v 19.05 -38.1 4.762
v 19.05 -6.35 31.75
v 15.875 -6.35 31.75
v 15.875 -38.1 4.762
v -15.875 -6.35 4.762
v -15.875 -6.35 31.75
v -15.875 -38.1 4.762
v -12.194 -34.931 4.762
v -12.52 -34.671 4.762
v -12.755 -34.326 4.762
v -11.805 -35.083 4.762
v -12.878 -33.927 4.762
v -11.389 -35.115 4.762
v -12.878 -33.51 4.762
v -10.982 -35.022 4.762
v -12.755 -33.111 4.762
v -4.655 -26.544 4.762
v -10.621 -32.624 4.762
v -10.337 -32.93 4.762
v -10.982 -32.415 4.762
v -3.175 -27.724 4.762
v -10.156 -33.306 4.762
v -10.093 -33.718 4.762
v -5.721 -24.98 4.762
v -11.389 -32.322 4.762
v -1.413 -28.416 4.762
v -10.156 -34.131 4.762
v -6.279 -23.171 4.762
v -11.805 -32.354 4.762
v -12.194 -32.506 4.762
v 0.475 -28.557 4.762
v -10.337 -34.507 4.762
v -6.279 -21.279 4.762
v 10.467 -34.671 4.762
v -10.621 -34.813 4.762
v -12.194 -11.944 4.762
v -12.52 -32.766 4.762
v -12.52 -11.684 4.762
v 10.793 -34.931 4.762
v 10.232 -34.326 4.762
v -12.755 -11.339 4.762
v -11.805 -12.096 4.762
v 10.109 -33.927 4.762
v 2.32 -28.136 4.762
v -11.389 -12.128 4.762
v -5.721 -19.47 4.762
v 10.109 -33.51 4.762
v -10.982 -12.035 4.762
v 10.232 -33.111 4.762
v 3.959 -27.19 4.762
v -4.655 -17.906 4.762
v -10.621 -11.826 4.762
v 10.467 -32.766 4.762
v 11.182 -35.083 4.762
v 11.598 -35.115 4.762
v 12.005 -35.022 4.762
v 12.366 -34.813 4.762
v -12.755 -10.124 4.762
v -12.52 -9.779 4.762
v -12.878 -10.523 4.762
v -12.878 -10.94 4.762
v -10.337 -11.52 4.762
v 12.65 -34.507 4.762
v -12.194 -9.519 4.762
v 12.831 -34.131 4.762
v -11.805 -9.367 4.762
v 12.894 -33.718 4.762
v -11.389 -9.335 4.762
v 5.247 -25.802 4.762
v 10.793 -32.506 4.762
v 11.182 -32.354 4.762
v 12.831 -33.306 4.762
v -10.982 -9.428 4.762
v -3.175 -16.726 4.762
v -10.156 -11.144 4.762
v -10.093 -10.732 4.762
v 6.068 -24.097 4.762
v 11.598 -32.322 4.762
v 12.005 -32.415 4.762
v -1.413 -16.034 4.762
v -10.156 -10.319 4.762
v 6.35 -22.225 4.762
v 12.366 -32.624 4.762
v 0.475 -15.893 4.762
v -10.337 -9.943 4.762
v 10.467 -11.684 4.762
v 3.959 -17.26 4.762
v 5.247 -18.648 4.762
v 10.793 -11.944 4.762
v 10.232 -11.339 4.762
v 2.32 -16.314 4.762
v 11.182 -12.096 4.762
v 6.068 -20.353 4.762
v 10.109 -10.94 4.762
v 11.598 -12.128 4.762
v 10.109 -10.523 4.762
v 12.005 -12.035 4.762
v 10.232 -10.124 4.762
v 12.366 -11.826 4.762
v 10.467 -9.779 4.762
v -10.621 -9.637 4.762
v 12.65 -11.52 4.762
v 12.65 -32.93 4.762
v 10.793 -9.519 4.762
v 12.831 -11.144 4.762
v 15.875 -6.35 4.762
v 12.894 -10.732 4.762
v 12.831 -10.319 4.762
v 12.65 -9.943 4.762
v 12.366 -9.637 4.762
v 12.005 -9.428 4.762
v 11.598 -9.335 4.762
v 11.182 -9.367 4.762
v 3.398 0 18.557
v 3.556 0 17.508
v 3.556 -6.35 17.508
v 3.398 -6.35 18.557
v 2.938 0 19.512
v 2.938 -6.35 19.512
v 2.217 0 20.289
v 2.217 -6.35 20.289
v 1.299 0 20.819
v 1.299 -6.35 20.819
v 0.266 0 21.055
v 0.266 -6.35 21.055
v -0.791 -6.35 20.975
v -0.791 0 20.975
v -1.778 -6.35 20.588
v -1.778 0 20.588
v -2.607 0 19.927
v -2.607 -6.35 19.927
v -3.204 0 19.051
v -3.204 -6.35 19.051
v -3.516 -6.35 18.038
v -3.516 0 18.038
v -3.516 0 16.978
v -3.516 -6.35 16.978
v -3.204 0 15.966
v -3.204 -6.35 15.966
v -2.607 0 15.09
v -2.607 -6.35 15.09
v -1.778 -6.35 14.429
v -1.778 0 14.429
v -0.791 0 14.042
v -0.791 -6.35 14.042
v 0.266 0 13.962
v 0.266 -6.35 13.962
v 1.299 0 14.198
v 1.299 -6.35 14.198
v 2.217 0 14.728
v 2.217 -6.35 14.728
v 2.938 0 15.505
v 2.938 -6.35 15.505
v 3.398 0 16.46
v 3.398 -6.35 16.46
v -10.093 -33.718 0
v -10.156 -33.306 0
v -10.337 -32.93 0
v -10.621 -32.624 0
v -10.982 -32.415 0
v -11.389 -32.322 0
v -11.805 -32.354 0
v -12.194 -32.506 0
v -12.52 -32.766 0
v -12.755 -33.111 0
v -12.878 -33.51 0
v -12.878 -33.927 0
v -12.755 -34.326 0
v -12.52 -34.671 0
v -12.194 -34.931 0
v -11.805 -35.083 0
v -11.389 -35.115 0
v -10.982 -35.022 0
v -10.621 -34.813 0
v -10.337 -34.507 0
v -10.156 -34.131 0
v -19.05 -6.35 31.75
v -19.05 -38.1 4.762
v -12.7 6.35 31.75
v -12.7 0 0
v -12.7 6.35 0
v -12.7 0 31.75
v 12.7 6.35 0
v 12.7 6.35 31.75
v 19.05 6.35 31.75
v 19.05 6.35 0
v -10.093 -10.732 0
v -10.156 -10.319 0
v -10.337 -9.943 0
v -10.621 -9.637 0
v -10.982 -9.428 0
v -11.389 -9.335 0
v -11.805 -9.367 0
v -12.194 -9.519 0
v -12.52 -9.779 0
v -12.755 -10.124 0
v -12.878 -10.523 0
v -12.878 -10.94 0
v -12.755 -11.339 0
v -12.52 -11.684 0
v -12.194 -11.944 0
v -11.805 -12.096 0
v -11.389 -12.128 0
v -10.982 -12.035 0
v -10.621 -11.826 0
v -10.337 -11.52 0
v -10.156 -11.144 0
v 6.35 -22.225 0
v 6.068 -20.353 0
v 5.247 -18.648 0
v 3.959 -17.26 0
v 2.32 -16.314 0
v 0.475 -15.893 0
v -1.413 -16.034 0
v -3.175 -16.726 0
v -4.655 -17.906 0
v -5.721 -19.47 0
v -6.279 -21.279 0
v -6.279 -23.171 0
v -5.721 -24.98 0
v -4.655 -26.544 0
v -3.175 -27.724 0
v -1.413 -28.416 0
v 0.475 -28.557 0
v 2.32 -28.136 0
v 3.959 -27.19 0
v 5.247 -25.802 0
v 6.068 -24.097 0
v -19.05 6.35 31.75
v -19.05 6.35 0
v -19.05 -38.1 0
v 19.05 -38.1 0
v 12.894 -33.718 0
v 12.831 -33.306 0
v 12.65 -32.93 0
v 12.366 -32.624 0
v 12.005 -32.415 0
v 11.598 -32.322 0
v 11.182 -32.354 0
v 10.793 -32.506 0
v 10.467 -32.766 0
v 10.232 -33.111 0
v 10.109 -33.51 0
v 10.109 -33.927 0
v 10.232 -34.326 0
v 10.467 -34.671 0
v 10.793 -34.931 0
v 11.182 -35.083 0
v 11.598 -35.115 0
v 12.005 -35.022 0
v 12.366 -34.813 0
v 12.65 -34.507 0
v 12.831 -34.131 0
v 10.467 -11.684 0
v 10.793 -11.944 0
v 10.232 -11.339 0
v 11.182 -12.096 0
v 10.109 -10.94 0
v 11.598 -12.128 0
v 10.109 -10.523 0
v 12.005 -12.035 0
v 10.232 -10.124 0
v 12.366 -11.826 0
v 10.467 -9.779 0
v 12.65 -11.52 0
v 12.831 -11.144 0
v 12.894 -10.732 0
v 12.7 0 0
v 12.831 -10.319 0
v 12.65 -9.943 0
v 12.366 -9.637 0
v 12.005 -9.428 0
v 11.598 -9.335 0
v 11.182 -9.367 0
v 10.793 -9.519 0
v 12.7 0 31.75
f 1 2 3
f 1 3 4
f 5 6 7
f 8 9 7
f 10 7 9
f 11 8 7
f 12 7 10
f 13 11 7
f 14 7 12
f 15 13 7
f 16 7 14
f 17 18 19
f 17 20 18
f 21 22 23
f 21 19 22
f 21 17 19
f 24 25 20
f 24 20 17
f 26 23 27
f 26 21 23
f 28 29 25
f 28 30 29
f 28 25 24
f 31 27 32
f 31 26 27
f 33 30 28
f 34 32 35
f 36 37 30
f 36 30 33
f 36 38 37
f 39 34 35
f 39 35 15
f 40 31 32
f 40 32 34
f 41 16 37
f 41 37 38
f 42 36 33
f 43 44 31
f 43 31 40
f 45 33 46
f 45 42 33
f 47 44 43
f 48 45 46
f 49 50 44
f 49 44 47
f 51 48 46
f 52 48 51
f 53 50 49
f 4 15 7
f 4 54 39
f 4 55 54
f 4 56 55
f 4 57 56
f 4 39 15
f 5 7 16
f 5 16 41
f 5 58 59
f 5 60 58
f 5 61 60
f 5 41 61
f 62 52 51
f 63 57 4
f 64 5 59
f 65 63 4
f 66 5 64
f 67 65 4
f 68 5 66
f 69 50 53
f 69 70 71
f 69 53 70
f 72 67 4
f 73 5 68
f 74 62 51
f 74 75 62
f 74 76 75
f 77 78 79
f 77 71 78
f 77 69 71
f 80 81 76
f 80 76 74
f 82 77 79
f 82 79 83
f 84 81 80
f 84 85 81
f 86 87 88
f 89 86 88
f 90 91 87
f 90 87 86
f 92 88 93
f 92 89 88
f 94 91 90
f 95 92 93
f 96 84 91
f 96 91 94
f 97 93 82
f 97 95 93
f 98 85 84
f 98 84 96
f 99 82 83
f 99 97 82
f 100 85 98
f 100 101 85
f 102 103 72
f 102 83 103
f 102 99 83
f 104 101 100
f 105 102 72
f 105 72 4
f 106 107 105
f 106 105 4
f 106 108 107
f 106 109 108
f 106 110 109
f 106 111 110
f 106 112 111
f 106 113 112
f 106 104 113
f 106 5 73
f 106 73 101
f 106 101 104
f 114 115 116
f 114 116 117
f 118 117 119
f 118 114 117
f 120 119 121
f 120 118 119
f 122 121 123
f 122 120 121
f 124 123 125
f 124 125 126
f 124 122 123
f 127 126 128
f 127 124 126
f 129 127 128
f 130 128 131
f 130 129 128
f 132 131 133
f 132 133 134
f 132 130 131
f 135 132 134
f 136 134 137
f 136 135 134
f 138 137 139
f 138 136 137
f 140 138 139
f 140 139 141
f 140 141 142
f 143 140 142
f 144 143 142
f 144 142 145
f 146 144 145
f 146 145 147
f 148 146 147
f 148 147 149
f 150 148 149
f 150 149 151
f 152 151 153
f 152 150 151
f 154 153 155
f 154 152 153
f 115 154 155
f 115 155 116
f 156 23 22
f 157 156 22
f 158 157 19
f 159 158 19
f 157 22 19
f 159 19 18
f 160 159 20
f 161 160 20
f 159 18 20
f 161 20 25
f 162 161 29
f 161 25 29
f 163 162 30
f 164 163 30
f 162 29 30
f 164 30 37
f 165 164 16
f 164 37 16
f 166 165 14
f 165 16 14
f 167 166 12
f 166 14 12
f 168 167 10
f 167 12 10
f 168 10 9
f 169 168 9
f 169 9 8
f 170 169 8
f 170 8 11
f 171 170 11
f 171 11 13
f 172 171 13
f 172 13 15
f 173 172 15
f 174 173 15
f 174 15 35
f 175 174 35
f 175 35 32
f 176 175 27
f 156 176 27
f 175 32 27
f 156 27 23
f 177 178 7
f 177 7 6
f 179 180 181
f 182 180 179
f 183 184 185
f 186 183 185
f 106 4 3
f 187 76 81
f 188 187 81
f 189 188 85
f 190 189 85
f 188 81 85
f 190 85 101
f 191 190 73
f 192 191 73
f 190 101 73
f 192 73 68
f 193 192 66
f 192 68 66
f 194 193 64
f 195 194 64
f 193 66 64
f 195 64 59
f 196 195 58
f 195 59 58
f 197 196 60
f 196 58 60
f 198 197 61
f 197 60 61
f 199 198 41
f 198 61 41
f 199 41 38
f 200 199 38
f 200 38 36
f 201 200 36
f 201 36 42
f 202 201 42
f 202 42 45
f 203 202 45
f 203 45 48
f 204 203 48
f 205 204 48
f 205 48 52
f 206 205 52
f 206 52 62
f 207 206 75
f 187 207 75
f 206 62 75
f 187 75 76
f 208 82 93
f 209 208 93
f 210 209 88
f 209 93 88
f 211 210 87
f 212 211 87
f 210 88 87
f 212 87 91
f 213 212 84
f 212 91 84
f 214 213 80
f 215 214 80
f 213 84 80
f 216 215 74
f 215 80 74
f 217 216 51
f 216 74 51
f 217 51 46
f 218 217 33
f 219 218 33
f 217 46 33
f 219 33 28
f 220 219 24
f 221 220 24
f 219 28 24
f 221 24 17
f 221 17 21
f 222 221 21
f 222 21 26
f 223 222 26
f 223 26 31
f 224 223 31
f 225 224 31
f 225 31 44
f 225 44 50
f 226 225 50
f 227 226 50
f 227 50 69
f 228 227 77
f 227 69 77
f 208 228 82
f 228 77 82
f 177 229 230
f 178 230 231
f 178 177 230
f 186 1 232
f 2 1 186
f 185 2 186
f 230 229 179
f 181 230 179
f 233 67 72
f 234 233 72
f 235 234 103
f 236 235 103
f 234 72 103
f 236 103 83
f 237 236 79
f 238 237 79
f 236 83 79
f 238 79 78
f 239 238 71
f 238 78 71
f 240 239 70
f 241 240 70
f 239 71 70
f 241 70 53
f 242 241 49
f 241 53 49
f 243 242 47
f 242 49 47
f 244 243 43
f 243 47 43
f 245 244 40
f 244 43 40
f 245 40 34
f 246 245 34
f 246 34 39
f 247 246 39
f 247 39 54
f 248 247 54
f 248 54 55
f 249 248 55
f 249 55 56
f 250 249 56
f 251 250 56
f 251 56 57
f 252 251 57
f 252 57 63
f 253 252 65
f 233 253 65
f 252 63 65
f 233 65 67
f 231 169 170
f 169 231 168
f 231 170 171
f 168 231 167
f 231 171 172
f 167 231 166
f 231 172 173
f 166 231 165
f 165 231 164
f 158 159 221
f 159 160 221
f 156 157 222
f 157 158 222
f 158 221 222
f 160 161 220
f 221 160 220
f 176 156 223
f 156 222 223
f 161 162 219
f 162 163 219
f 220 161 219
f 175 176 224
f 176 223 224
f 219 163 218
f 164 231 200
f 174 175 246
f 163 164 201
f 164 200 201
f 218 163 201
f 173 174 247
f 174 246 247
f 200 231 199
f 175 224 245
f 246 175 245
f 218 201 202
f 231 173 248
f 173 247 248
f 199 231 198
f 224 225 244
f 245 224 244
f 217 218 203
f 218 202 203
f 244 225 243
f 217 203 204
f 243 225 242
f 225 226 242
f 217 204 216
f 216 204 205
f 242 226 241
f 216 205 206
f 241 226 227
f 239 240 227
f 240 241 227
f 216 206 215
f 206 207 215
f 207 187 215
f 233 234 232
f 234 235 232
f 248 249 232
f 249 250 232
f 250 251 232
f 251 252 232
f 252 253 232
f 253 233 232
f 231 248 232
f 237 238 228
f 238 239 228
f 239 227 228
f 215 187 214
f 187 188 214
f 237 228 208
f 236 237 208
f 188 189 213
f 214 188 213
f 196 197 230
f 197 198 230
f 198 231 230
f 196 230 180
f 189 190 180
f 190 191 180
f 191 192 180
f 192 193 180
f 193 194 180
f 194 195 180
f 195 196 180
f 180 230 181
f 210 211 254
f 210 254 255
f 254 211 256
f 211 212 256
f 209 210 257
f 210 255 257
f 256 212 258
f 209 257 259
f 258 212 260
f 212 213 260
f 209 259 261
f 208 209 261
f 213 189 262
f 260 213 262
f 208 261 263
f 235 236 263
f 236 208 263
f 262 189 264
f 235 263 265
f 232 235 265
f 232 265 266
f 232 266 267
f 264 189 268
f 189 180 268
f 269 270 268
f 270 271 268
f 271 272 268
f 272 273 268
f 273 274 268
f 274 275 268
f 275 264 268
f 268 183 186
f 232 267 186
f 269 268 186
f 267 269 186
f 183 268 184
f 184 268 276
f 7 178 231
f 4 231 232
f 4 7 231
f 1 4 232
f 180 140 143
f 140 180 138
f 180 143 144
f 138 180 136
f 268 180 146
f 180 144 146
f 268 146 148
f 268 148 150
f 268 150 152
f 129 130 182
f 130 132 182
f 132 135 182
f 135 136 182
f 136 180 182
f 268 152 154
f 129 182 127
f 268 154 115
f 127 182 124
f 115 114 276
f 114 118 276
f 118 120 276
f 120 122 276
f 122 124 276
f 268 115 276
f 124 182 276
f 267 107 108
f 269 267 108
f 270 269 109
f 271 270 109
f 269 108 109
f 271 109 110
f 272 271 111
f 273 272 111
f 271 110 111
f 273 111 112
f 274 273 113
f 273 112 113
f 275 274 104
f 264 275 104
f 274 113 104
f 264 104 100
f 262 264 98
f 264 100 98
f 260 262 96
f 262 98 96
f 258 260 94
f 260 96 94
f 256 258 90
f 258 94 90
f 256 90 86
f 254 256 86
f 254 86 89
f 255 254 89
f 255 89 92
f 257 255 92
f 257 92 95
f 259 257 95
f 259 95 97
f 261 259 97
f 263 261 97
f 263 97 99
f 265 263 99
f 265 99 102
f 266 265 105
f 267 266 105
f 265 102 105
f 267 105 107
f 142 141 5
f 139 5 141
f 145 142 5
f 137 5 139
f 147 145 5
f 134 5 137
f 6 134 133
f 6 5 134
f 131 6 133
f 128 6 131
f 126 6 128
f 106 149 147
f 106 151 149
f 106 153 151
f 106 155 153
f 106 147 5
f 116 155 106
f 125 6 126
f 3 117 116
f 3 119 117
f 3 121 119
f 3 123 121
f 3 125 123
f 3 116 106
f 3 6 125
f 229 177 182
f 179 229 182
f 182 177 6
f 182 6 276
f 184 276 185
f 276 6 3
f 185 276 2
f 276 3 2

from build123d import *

# Parameters (mm, degrees)
F0_W      = 25.4
F0_H      = 31.75
F1_DEPTH  = 6.35
F2_W      = 6.35
F2_H      = 31.75
F3_DEPTH  = 12.7
F4_W      = 38.1
F4_H      = 4.7625
F5_DEPTH  = 31.75
F7_DEPTH  = 3.175
F9_DEPTH  = 3.175
F10_R     = 3.556
F11_DEPTH = 6.35
F12_R     = 1.4
F12_R_2   = 6.35
F13_DEPTH = 4.7625


with BuildPart() as f1:
    # F0 (on Front) → F1 (new body)
    with BuildSketch(Plane.XZ):
        with Locations((0, 15.875)):
            Rectangle(F0_W, F0_H)
    extrude(amount=F1_DEPTH)

    # F2 (on face) → F3 (join)
    with BuildSketch(Plane.XZ.offset(6.35)):
        with Locations((-15.875, 15.875)):
            Rectangle(F2_W, F2_H)
        with Locations((15.875, 15.875)):
            Rectangle(F2_W, F2_H)
    extrude(amount=-F3_DEPTH)

    # F4 (on face) → F5 (join)
    with BuildSketch(Plane.XZ.offset(6.35)):
        with Locations((0, 2.38125)):
            Rectangle(F4_W, F4_H)
    extrude(amount=F5_DEPTH)

    # F6 (on face) → F7 (join)
    with BuildSketch(Plane(origin=(-19.05, 0, 0), x_dir=(0, -1, 0), z_dir=(-1, 0, 0))):
        Polygon((38.1, 4.7625), (6.35, 31.75), (6.35, 4.7625), align=None)
    extrude(amount=-F7_DEPTH)

    # F8 (on face) → F9 (join)
    with BuildSketch(Plane.YZ.offset(19.05)):
        Polygon((-6.35, 4.7625), (-6.35, 31.75), (-38.1, 4.7625), align=None)
    extrude(amount=-F9_DEPTH)

    # F10 (on Front) → F11 (cut)
    with BuildSketch(Plane.XZ):
        with Locations((0, 17.508461)):
            Circle(F10_R)
    extrude(amount=F11_DEPTH, mode=Mode.SUBTRACT)

    # F12 (on face) → F13 (cut, through all)
    with BuildSketch(Plane.XY.offset(4.7625)):
        with Locations((11.4935, -33.7185)):
            Circle(F12_R)
        with Locations((-11.4935, -33.7185)):
            Circle(F12_R)
        with Locations((11.4935, -10.7315)):
            Circle(F12_R)
        with Locations((-11.4935, -10.7315)):
            Circle(F12_R)
        with Locations((0, -22.225)):
            Circle(F12_R_2)
    extrude(amount=-F13_DEPTH, mode=Mode.SUBTRACT)


solid = f1.part
